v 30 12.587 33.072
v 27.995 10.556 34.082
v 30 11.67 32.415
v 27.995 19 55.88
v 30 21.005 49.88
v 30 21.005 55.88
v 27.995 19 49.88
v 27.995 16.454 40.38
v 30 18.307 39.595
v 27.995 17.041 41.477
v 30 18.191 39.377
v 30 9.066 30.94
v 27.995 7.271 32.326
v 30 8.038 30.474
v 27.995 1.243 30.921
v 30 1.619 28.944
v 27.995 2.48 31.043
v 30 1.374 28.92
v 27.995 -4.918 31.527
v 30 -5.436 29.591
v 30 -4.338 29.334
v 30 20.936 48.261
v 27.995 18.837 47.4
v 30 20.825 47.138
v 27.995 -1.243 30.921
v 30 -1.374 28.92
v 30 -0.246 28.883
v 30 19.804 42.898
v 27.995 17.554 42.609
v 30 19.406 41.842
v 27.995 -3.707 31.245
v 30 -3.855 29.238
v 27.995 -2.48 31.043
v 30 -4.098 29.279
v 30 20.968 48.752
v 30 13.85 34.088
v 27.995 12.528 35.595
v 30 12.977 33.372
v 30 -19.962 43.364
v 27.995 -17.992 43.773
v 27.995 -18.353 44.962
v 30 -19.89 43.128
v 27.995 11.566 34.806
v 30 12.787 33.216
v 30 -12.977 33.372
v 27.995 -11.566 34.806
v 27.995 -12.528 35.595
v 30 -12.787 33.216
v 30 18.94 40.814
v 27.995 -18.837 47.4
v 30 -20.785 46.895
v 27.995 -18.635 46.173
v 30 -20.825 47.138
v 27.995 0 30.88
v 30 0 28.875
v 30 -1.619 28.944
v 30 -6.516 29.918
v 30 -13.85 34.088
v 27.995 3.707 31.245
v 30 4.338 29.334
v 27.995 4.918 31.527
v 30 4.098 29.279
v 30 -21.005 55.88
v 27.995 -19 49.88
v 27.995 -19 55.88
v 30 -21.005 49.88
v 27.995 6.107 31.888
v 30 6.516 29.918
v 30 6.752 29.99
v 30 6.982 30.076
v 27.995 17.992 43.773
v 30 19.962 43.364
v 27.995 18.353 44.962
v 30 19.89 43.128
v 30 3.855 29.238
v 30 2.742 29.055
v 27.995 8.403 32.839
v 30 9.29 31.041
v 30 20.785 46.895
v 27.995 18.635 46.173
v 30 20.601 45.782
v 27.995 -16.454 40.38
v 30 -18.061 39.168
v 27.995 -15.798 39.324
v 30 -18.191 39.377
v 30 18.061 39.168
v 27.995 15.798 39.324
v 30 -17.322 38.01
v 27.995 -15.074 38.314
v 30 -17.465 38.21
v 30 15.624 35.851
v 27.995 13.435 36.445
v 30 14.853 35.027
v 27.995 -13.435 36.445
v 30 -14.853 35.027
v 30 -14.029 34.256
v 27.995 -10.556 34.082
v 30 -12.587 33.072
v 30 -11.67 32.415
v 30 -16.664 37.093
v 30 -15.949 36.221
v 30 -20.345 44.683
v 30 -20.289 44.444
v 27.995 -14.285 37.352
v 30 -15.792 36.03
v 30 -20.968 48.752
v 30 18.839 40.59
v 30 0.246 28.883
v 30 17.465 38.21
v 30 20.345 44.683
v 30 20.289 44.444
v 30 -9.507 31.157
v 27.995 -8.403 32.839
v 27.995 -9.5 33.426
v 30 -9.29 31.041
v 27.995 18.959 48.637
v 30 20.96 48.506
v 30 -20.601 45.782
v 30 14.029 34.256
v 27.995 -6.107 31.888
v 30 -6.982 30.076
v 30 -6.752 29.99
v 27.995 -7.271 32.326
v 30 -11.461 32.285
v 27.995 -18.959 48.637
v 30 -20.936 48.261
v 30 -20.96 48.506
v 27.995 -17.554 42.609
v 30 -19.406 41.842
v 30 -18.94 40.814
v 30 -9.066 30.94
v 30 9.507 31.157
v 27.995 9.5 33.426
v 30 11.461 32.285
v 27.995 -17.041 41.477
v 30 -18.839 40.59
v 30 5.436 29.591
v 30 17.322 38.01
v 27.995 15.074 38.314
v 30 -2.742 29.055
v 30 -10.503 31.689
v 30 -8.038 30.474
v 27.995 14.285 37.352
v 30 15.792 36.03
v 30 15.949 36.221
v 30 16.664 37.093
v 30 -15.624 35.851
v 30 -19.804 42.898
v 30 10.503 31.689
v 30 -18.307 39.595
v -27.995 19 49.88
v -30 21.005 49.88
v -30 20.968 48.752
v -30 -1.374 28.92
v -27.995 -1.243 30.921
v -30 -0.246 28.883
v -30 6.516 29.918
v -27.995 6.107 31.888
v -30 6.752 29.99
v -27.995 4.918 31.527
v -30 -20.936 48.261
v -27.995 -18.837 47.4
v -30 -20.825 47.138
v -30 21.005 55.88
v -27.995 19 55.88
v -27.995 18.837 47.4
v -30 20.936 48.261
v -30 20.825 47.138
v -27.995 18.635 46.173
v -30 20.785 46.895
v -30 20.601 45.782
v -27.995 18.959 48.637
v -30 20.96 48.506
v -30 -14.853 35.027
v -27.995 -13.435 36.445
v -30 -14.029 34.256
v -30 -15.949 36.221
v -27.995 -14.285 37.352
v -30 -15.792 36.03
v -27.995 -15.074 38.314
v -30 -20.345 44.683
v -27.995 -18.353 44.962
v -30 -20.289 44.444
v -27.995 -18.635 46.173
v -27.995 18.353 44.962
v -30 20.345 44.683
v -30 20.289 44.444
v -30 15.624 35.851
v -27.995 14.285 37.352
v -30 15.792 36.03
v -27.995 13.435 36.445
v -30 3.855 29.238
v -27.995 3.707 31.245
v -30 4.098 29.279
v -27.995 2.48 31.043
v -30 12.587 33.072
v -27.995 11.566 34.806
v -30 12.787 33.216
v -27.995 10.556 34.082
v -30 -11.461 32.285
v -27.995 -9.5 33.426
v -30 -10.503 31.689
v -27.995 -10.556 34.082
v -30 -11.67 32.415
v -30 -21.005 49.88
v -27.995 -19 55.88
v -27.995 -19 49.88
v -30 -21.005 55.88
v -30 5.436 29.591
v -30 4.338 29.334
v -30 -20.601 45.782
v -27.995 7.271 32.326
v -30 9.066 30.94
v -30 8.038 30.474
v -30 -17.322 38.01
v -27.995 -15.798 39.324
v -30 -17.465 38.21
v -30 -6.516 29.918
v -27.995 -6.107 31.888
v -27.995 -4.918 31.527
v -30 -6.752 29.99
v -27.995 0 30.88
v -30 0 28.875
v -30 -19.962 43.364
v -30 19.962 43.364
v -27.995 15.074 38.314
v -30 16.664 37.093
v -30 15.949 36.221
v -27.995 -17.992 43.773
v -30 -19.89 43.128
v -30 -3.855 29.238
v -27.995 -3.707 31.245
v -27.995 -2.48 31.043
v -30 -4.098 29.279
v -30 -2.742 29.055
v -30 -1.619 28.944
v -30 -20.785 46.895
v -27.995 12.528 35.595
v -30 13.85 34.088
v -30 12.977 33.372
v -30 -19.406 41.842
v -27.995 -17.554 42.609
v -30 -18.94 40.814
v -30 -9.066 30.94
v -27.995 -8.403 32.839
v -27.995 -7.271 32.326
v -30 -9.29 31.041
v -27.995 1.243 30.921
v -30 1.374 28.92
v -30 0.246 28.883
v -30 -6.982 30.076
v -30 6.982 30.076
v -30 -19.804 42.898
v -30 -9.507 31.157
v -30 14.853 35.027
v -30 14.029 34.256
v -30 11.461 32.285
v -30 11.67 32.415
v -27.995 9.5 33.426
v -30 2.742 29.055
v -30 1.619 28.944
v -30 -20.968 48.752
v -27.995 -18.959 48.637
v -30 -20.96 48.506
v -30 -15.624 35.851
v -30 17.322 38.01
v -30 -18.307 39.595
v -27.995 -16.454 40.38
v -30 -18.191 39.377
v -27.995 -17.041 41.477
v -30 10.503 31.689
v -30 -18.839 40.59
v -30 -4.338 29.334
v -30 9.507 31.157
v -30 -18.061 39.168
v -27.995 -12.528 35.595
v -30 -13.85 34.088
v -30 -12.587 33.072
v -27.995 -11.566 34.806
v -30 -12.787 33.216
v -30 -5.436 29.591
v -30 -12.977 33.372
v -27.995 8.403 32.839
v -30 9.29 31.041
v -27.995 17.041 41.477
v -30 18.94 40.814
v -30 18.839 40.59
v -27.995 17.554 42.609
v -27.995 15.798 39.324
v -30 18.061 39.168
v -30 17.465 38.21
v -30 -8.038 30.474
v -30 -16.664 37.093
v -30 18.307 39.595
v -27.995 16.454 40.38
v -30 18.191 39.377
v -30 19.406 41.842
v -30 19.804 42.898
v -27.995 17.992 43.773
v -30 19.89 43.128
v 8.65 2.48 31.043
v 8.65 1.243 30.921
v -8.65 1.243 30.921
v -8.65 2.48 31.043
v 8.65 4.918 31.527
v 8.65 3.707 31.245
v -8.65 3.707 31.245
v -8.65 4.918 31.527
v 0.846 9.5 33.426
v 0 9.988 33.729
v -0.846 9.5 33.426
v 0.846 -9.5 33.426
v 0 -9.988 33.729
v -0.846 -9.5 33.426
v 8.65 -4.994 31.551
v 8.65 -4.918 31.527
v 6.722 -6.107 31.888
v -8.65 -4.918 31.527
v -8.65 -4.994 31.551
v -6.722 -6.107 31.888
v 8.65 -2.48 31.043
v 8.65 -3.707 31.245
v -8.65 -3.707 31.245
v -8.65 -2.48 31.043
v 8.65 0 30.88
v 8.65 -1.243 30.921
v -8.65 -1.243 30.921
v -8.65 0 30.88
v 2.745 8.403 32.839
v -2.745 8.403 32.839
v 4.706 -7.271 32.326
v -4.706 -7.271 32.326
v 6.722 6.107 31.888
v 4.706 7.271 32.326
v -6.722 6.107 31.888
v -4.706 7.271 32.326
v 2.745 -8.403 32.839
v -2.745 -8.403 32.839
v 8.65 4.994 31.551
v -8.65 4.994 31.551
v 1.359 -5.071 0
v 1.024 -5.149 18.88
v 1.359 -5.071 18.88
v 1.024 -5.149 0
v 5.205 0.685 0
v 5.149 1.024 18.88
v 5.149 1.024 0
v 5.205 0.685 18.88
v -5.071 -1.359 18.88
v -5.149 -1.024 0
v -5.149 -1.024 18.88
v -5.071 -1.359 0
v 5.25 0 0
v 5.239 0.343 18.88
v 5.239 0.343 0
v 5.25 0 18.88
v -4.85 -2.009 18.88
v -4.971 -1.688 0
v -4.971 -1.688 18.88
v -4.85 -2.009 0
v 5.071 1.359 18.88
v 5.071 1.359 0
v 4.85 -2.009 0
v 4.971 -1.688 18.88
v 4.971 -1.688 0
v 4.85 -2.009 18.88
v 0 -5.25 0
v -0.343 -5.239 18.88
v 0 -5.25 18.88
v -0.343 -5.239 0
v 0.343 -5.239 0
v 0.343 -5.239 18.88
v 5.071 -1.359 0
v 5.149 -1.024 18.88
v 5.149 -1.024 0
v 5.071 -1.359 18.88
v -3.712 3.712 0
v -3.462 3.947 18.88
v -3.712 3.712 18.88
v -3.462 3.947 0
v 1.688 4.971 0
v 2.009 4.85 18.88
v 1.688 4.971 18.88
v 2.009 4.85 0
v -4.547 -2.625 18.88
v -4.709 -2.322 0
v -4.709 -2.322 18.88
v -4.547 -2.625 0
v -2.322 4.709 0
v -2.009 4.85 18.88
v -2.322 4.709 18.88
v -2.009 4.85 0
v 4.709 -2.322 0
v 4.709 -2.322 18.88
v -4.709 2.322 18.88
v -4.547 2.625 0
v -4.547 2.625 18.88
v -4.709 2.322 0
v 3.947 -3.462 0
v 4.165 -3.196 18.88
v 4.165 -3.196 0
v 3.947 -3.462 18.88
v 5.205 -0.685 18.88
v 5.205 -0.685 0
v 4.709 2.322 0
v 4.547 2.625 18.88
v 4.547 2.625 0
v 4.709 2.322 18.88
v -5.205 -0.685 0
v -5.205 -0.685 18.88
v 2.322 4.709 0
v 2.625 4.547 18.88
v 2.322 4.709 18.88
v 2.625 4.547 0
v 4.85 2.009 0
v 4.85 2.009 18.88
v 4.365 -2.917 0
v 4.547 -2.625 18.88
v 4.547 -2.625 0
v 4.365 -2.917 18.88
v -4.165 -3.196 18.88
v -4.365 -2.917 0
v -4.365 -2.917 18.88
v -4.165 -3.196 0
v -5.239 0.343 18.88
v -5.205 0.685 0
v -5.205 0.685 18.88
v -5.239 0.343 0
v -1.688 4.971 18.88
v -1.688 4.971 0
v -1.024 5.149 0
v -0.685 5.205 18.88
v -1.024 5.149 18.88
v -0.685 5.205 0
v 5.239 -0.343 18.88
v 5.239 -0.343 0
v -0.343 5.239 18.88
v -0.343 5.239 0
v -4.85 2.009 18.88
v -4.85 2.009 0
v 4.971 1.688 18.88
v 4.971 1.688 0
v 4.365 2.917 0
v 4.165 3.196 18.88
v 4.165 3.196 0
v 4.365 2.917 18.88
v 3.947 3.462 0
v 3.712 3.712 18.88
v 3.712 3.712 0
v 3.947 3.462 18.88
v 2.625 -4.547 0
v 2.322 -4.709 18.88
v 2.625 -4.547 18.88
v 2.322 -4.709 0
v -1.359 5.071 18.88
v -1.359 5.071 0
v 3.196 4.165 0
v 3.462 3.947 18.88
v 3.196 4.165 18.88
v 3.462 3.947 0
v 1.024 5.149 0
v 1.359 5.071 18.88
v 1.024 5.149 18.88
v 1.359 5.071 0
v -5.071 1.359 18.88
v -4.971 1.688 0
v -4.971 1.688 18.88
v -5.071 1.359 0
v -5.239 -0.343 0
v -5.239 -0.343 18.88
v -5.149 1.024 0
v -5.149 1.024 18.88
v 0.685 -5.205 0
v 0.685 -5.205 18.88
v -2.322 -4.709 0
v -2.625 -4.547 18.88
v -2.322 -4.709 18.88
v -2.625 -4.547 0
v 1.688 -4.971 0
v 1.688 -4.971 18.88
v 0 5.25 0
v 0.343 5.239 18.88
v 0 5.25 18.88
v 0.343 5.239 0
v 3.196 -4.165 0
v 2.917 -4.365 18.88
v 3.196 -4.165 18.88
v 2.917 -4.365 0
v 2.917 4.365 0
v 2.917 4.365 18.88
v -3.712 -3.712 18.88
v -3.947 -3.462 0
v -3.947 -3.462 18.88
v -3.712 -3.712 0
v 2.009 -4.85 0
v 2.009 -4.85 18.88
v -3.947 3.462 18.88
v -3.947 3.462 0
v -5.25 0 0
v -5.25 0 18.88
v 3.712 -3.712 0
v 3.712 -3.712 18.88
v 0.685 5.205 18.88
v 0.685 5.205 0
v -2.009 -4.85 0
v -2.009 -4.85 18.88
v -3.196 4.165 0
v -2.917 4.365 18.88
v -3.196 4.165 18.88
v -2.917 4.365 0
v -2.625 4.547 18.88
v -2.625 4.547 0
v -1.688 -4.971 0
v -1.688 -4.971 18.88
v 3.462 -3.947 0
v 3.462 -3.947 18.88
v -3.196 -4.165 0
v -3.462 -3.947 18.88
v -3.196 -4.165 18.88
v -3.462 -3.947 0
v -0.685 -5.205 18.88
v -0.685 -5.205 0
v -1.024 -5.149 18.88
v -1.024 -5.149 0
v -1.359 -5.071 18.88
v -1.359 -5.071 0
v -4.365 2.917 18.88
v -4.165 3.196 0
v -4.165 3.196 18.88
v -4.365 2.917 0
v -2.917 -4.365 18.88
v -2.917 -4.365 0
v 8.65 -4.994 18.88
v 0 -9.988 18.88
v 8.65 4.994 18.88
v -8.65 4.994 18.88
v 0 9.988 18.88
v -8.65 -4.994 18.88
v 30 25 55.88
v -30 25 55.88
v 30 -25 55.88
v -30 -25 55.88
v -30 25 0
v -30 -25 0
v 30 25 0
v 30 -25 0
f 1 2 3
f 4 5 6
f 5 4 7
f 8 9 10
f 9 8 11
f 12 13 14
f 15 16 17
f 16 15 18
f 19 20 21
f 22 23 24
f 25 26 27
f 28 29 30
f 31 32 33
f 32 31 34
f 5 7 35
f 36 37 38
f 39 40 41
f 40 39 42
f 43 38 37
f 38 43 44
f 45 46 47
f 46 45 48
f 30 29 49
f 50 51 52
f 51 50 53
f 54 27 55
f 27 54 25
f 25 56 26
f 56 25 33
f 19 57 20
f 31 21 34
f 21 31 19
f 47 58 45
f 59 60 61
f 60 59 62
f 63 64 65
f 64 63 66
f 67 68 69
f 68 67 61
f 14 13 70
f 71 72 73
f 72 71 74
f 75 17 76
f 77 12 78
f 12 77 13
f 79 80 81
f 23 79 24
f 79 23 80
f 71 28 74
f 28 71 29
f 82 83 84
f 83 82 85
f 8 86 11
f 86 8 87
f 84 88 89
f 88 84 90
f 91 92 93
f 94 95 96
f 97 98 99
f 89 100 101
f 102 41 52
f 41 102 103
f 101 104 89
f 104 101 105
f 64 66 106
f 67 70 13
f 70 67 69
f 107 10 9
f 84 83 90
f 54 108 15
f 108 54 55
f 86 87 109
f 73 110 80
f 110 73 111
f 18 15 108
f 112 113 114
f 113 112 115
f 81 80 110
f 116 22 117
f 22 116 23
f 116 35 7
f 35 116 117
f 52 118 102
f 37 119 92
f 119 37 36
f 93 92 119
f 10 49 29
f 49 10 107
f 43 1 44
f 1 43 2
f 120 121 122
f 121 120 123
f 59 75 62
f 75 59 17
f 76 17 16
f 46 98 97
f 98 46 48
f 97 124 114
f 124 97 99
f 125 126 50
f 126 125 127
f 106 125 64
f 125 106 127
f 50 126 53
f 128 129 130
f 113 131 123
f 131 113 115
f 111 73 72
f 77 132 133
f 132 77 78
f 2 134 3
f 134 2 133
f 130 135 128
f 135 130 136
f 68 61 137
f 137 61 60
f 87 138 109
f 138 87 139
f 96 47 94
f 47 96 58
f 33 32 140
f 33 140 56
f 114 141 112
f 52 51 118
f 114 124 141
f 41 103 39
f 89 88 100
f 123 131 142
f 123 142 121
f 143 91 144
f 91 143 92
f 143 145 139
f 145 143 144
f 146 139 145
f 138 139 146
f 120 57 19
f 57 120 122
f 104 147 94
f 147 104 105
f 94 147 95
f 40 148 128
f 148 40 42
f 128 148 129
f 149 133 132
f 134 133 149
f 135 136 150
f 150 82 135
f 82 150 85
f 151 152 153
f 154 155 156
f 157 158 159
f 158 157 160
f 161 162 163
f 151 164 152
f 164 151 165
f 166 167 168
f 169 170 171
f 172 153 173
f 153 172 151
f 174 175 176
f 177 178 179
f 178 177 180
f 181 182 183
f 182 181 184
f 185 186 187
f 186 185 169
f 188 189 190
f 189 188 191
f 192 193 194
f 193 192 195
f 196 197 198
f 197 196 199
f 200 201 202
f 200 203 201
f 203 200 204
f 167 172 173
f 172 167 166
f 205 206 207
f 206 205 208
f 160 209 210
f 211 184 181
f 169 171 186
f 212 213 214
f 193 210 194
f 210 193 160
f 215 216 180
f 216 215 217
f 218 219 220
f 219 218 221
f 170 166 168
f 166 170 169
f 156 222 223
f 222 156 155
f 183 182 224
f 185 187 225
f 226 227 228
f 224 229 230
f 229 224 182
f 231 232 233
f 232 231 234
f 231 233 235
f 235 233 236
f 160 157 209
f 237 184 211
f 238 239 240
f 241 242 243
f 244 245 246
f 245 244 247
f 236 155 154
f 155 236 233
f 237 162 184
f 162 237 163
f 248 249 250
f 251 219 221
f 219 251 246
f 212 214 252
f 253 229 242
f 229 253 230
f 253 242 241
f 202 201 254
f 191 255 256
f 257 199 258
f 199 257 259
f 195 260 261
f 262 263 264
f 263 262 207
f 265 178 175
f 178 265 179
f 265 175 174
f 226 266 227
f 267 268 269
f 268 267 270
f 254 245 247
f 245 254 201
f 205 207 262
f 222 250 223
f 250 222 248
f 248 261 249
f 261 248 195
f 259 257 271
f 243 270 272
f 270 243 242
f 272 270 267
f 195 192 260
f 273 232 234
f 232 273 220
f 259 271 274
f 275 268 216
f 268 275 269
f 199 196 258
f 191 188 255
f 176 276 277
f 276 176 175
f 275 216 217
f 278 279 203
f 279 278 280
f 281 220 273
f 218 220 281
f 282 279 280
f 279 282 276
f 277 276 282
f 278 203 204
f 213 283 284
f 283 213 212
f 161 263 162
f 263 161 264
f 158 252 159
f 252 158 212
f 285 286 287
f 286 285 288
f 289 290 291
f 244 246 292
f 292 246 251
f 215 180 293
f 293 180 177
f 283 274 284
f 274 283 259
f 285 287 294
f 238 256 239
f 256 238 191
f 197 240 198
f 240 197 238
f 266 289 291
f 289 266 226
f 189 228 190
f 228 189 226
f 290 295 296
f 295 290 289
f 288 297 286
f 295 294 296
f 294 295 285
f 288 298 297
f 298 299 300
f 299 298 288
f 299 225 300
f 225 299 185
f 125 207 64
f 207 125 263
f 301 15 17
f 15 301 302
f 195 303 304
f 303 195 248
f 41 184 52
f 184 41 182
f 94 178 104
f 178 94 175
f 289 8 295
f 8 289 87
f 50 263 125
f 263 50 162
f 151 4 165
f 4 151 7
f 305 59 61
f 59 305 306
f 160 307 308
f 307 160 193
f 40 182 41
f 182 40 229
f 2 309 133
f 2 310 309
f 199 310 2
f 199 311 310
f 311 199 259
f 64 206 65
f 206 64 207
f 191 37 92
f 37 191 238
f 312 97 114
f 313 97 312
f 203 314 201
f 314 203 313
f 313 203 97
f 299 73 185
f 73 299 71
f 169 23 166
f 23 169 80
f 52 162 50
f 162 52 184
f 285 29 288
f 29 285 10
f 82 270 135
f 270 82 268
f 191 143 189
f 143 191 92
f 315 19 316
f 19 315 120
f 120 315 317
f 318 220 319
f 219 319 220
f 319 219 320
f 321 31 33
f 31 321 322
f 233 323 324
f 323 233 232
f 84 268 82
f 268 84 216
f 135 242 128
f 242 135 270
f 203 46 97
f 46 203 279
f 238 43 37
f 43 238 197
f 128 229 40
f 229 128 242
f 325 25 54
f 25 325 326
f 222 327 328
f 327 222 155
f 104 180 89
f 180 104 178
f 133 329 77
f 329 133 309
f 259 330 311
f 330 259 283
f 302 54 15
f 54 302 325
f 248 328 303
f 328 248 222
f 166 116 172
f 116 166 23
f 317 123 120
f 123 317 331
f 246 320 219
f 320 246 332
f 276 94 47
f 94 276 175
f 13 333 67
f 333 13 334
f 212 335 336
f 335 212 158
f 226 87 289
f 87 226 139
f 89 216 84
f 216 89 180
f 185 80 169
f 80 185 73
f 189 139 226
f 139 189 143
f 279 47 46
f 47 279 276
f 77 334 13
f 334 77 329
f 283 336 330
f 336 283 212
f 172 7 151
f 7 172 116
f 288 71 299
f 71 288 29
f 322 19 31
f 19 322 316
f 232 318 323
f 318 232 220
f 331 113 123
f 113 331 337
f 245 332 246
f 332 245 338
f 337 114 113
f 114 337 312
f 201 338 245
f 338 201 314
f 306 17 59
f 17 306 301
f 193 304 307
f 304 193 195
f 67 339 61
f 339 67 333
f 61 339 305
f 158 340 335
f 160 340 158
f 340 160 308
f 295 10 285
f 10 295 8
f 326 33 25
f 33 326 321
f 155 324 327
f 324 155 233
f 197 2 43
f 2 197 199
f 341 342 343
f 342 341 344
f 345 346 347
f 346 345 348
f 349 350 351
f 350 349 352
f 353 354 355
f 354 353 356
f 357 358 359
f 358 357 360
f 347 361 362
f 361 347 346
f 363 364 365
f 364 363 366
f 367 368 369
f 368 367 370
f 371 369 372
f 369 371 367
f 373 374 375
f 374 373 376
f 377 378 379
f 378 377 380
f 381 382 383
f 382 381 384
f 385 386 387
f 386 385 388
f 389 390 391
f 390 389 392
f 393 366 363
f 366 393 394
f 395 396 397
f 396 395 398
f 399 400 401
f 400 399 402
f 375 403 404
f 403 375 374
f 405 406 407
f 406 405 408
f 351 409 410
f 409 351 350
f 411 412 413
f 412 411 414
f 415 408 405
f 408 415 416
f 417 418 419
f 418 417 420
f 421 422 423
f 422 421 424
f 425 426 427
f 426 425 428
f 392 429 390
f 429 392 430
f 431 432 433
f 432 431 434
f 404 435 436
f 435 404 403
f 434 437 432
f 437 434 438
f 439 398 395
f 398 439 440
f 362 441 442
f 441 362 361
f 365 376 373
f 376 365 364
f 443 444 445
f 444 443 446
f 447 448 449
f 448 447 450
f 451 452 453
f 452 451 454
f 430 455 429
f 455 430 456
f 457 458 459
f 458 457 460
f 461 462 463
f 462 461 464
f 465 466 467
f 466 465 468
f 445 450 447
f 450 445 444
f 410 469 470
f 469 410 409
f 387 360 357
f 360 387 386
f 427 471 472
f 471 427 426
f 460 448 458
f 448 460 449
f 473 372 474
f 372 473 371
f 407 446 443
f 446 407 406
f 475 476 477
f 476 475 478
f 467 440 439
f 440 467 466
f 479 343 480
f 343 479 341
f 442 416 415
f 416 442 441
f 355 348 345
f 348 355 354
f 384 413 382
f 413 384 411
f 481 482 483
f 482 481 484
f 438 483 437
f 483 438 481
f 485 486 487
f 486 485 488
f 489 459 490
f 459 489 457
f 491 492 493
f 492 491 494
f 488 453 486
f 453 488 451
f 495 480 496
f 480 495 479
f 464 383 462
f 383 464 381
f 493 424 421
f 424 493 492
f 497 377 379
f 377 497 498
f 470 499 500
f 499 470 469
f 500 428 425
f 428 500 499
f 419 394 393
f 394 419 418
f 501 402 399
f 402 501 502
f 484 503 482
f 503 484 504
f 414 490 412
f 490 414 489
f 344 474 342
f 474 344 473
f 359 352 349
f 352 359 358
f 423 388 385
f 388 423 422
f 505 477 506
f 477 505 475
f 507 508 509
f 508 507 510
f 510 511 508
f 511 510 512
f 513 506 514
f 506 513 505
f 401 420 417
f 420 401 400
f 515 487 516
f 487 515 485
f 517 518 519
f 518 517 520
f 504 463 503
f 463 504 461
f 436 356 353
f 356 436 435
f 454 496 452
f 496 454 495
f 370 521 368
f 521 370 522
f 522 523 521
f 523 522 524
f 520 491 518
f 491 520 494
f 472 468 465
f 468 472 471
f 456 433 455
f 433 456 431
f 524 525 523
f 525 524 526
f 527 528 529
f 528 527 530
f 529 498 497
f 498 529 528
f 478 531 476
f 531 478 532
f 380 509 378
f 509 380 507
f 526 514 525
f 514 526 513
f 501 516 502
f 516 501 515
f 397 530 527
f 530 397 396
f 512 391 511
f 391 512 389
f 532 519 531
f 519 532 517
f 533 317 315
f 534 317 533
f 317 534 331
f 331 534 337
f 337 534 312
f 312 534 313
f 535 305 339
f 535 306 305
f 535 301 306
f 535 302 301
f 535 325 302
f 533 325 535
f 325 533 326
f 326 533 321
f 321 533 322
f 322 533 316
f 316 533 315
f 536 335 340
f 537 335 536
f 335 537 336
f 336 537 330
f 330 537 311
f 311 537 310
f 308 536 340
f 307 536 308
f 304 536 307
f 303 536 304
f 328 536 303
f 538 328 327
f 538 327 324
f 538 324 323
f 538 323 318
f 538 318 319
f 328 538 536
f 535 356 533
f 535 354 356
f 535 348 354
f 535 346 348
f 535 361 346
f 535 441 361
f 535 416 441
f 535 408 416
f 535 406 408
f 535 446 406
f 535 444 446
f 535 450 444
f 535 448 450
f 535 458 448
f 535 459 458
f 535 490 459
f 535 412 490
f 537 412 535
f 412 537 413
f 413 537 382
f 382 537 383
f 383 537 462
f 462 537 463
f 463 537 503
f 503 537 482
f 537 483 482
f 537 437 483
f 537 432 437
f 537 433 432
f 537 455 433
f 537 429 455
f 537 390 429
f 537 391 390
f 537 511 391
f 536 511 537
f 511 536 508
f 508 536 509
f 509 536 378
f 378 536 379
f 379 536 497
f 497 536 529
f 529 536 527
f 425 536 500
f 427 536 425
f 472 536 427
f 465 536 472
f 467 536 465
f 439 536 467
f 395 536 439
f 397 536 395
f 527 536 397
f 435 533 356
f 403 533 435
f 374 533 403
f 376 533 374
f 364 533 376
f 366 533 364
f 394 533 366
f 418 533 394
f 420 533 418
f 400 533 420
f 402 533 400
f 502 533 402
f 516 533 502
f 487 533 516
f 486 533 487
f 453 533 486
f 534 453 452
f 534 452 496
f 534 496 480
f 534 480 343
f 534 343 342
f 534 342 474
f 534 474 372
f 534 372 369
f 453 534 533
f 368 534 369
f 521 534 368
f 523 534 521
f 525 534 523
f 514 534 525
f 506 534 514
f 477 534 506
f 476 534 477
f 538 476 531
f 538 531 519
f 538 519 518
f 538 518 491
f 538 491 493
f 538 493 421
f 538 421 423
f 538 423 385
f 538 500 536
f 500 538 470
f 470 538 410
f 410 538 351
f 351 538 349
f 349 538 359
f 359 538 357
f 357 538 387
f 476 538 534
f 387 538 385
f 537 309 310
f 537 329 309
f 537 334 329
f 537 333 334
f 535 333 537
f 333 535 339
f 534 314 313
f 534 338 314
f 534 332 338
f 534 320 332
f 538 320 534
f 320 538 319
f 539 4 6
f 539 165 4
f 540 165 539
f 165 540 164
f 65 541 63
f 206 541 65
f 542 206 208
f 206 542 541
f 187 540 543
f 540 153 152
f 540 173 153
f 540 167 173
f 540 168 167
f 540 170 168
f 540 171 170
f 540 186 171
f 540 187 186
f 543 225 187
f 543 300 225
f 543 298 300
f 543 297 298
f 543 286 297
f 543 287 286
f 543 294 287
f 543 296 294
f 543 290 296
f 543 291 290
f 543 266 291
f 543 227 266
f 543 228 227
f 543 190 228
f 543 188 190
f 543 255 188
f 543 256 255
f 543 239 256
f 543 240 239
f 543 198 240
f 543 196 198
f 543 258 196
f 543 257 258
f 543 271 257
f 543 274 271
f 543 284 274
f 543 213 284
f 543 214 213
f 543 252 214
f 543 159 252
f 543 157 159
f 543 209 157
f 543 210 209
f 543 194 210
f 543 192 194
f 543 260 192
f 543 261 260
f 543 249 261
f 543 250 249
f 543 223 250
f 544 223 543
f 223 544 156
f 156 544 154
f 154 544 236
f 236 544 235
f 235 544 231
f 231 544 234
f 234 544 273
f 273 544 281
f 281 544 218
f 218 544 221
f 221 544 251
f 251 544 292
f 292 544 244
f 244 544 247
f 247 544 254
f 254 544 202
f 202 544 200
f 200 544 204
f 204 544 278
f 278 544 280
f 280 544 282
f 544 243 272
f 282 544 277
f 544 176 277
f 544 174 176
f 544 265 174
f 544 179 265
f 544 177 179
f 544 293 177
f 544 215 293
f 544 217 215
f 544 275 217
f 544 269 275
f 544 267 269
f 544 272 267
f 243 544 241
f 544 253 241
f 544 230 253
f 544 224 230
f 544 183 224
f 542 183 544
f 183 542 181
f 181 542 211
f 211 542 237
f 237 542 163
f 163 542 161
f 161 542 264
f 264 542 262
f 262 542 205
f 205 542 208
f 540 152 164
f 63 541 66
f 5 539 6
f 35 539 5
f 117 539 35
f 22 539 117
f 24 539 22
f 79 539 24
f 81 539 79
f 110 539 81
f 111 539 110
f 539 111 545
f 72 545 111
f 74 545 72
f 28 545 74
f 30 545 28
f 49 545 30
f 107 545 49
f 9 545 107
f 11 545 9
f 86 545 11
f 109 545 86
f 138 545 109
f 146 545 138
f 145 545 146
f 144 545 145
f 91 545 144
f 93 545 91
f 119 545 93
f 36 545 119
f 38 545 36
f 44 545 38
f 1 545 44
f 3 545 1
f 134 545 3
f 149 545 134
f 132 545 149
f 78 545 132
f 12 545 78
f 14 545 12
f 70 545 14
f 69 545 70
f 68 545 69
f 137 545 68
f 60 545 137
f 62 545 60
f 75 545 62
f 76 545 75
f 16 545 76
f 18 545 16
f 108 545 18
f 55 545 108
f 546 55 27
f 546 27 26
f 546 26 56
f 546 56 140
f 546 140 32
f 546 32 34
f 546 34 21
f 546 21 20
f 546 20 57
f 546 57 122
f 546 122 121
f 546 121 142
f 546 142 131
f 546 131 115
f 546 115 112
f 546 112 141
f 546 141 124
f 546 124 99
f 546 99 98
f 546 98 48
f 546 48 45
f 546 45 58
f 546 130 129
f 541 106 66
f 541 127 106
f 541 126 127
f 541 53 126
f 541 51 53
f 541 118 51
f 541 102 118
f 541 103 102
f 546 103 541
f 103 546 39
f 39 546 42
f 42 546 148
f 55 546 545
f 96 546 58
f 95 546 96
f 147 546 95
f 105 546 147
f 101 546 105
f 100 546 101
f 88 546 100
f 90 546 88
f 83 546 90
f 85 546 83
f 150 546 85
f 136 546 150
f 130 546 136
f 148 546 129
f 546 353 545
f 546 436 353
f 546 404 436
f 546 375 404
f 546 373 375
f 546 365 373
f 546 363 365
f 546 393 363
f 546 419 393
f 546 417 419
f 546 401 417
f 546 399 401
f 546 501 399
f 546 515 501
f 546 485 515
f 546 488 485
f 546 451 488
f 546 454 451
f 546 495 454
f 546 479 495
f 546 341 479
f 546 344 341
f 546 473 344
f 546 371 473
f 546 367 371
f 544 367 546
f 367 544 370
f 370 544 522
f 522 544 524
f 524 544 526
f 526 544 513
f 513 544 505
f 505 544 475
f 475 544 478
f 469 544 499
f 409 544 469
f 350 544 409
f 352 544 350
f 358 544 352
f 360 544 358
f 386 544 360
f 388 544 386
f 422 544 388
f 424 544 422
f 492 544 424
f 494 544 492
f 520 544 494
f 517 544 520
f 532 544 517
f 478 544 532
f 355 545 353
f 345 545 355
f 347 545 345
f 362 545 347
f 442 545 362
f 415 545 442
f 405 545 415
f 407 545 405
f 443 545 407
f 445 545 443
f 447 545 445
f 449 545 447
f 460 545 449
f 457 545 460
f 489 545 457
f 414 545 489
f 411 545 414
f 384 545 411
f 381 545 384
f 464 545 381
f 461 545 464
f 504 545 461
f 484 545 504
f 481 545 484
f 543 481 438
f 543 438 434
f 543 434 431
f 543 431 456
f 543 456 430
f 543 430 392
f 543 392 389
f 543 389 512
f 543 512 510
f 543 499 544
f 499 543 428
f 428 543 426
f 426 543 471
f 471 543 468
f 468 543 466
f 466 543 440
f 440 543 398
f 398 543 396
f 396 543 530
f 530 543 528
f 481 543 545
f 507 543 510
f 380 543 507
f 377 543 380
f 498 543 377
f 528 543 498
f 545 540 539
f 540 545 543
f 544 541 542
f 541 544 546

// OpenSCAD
// file: FET_pipe_guide.scad
// freETarget (Competition build) pipe-guide bracket
// A hex pocket traps the M10 bolt head (NUT_TRAP = false) or an M10 nut (NUT_TRAP = true),
// so the fastener is tightened from inside the target box.
// Build all four STLs with ../build-stls.sh.
// Rides the 1" steel pipe uprights so the target can't twist while raising/lowering.
// Source dims: freETarget drawings FRE-007 / FRE-008 (side panels):
//   housing outside width 304 mm, 2x dia 10 mm side holes, 250 mm apart.
//
// Model axes: X = out from the side panel (X=0 is the panel face, printed on the bed)
//             Y = front/back,  Z = vertical, Z=0 at the side-hole centre.
// Set ONE_PIECE = true for a single bracket spanning both holes (needs a >=310 mm bed).

ONE_PIECE   = false;
NUT_TRAP    = false;        // true: trap an M10 nut (bolt head inside the box, use M10x40)
                            // false: trap the hex bolt HEAD (nut inside the box, use M10x55)

IN          = 25.4;
TARGET_W    = 304;          // outside width across side panels
PIPE_GAP_W  = 14.4 * IN;    // design inside-to-inside pipe spacing (measured ~14.5")
PIPE_OD     = 33.4;         // 1" NPS steel pipe = 1.315"
HOLE_PITCH  = 250;          // side-hole spacing

U_CLEAR     = 2.3;          // radial clearance, pipe to U
ARM_T       = 6;            // U arm wall thickness
ARM_PAST    = 6;            // how far the arms extend past the U centre
LEN         = 60;           // height of each bracket head
LEAD        = 2;            // 45-degree lead-in on the U at top and bottom
BOLT_D      = 10.5;         // M10 clearance
HEX_AF      = 17.3;         // hex pocket across flats: traps a 17 mm (DIN 933) or 16 mm (ISO 4017) M10 head
HEAD_H      = NUT_TRAP ? 8 : 6.4;       // M10 nut height / M10 hex head height
HEAD_RECESS = NUT_TRAP ? 4 : 1.5;       // nut/head top sits this far below the U floor
WEB_T       = 10;           // one-piece only: web thickness

FLOOR_X   = (PIPE_GAP_W - TARGET_W) / 2;   // 30.88
U_R       = PIPE_OD/2 + U_CLEAR;           // 19.0
U_CX      = FLOOR_X + U_R;
HALF_W    = U_R + ARM_T;
X_MAX     = U_CX + ARM_PAST;
CB_BOTTOM = FLOOR_X - HEAD_RECESS - HEAD_H;

$fn = 96;

module u_cavity_2d(r) {            // in the XY plane
    translate([U_CX, 0]) circle(r);
    translate([U_CX, -r]) square([X_MAX + 10, 2*r]);
}

module u_cavity() {                // extruded along Z with lead-in flares at both ends
    translate([0,0,-LEN/2 - 1]) linear_extrude(LEN + 2) u_cavity_2d(U_R);
    // 45-degree flare: radius U_R at (LEN/2 - LEAD), U_R + LEAD + 0.5 at (LEN/2 + 0.5)
    for (s = [-1, 1])
        hull() {
            translate([0,0, s*(LEN/2 - LEAD)]) linear_extrude(0.01, center=true) u_cavity_2d(U_R);
            translate([0,0, s*(LEN/2 + 0.5)])  linear_extrude(0.01, center=true) u_cavity_2d(U_R + LEAD + 0.5);
        }
}

module bolt_cut() {
    rotate([0,90,0]) translate([0,0,-1]) cylinder(d=BOLT_D, h=X_MAX + 2);
    // hex pocket (anti-rotation) for the bolt head
    translate([CB_BOTTOM,0,0]) rotate([0,90,0]) rotate([0,0,30])
        cylinder(d=HEX_AF/cos(30), h=X_MAX, $fn=6);
}

module head_body() {
    translate([0, -HALF_W, -LEN/2]) cube([X_MAX, 2*HALF_W, LEN]);
}

module bracket() {
    difference() {
        union() {
            head_body();
            if (ONE_PIECE) {
                translate([0,0,HOLE_PITCH]) head_body();
                translate([0, -HALF_W, 0]) cube([WEB_T, 2*HALF_W, HOLE_PITCH]);
            }
        }
        u_cavity();
        bolt_cut();
        if (ONE_PIECE) translate([0,0,HOLE_PITCH]) { u_cavity(); bolt_cut(); }
    }
}

// Print orientation: panel face (X=0) down on the bed.
rotate([0,-90,0]) bracket();
// main file
// captured_nut_print_x4
include <FET_pipe_guide.scad>
NUT_TRAP  = true;
ONE_PIECE = false;
